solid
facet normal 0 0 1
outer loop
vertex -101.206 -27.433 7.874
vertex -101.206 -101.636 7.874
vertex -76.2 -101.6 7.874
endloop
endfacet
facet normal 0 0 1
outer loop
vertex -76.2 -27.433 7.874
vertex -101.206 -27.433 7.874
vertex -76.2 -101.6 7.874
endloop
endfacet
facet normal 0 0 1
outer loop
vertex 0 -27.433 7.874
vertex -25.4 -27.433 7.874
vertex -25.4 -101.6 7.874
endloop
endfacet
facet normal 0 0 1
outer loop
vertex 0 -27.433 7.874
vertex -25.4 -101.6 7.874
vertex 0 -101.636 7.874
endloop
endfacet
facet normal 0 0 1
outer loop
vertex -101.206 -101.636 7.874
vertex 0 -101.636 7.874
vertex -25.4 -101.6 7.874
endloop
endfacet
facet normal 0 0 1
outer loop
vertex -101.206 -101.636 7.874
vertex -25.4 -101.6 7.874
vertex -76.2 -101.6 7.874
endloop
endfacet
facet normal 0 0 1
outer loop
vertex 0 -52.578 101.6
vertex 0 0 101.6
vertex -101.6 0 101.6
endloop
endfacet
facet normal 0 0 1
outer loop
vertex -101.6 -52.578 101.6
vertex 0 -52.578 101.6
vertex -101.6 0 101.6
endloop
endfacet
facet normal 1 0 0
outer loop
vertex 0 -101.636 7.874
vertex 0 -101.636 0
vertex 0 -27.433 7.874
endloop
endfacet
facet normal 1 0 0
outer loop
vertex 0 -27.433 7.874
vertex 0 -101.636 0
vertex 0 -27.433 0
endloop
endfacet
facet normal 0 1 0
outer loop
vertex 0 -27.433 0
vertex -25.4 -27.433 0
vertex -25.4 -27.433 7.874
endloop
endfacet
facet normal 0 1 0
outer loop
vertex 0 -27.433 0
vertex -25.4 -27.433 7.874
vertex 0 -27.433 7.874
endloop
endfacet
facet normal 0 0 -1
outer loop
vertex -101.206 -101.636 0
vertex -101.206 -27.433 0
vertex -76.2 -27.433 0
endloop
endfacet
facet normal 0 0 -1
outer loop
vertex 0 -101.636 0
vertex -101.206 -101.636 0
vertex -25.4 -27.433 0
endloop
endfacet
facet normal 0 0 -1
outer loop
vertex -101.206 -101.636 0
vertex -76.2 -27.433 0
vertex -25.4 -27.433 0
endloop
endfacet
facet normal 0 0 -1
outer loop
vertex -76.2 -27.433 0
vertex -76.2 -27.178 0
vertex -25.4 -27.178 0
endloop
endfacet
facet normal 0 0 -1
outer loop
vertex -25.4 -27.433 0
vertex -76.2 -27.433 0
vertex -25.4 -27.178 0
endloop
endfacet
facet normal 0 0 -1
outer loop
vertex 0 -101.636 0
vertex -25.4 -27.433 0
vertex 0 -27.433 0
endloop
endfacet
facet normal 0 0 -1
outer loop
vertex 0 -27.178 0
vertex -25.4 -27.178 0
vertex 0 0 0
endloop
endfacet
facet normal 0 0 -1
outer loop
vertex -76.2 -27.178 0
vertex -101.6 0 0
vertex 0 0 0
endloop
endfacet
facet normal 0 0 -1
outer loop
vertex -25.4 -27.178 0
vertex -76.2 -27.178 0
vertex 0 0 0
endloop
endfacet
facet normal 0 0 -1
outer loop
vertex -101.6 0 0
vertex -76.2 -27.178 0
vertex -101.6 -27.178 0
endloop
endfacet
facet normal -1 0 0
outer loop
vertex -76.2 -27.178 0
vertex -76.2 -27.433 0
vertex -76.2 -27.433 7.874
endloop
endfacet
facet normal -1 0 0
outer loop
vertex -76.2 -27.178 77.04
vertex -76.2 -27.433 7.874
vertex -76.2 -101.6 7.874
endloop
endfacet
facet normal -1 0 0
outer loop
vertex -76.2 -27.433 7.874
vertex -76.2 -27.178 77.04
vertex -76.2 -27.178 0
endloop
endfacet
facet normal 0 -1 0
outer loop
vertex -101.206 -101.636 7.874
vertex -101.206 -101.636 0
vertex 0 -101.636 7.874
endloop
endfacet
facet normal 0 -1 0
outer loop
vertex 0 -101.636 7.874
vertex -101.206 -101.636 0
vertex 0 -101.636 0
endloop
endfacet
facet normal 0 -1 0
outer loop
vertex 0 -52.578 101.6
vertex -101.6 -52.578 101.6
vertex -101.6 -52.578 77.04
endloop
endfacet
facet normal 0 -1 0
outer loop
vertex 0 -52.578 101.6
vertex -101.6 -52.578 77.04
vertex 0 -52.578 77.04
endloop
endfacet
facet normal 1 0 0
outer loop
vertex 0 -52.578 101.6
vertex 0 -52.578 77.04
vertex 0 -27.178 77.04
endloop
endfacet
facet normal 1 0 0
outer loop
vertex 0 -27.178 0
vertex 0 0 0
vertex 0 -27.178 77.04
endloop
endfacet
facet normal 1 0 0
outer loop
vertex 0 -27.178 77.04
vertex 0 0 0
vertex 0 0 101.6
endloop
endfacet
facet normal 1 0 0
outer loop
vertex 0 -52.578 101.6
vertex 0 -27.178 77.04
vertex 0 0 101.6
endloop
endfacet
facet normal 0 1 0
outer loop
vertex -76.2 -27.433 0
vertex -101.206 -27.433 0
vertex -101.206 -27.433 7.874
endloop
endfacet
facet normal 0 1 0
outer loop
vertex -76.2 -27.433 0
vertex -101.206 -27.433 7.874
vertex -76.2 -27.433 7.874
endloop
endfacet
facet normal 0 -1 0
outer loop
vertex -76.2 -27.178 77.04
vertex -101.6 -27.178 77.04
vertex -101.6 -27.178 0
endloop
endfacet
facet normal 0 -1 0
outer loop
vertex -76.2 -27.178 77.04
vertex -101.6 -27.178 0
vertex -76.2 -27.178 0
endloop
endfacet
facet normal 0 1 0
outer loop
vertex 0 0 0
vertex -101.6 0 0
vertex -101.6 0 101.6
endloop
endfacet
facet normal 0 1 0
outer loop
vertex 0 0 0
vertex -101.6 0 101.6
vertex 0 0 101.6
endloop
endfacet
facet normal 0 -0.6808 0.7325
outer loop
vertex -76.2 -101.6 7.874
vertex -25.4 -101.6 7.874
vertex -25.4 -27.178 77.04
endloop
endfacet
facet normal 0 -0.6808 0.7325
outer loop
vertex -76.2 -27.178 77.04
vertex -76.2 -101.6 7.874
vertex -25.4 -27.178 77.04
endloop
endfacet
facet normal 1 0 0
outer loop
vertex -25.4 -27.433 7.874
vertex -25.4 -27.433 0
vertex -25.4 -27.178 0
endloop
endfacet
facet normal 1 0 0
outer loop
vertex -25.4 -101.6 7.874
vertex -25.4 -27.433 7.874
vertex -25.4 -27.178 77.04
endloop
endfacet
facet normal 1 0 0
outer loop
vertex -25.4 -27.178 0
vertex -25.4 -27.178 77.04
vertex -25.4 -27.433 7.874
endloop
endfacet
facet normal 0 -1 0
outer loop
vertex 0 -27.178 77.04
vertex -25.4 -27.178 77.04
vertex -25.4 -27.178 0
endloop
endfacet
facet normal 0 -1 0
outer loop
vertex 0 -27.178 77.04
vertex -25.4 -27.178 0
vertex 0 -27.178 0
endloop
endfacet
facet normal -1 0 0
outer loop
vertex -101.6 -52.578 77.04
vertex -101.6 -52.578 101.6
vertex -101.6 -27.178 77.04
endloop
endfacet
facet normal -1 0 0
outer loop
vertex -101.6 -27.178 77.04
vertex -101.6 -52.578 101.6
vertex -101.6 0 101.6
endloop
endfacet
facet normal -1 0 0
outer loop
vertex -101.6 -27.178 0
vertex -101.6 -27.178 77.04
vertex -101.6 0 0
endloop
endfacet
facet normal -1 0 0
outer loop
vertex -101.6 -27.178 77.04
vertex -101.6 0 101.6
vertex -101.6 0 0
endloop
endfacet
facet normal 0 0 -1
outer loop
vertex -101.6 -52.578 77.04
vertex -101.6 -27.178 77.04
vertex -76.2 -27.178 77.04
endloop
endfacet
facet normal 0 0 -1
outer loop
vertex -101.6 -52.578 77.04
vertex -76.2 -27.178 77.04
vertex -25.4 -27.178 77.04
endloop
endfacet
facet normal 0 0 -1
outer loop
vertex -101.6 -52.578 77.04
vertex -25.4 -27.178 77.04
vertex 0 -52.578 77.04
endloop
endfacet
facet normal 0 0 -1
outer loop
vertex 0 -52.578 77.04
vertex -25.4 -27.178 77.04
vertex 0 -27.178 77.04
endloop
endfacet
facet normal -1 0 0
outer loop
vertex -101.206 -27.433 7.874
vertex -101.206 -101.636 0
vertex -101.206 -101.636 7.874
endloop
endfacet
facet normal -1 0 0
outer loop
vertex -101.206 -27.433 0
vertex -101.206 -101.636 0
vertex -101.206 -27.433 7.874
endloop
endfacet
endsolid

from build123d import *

# Parameters (mm, degrees)
F0_W     = 101.6
F0_H     = 101.6
F1_DEPTH = 101.6
F2_W     = 25.4
F2_H     = 101.6
F3_DEPTH = 74.422
F4_W     = 101.205684
F4_H     = 74.202821
F5_DEPTH = 7.874
F7_DEPTH = 102.616
F9_DEPTH = 25.4


with BuildPart() as f1:
    # F0 (on Top) → F1 (new body)
    with BuildSketch(Plane.XY):
        with Locations((-50.8, -50.8)):
            Rectangle(F0_W, F0_H)
    extrude(amount=F1_DEPTH)

    # F2 (on face) → F3 (cut)
    with BuildSketch(Plane.XZ.offset(101.6)):
        with Locations((-12.7, 50.8)):
            Rectangle(F2_W, F2_H)
        with Locations((-88.9, 50.8)):
            Rectangle(F2_W, F2_H)
    extrude(amount=-F3_DEPTH, mode=Mode.SUBTRACT)

    # F4 (on Top) → F5 (join)
    with BuildSketch(Plane.XY):
        with Locations((-50.602842, -64.534433)):
            Rectangle(F4_W, F4_H)
    extrude(amount=F5_DEPTH)

    # F6 (on face) → F7 (cut)
    with BuildSketch(Plane.YZ.offset(-25.4)):
        Polygon((-101.6, 101.6), (-101.6, 7.874), (-27.178, 77.03993), (-27.178, 101.6), align=None)
    extrude(amount=-F7_DEPTH, mode=Mode.SUBTRACT)

    # F8 (on face) → F9 (join)
    with BuildSketch(Plane.XZ.offset(27.178)):
        Polygon((0, 101.6), (-101.6, 101.6), (-101.6, 77.03993), (-76.2, 77.03993), (-25.4, 77.03993), (0, 77.03993), align=None)
    extrude(amount=F9_DEPTH)


solid = f1.part
